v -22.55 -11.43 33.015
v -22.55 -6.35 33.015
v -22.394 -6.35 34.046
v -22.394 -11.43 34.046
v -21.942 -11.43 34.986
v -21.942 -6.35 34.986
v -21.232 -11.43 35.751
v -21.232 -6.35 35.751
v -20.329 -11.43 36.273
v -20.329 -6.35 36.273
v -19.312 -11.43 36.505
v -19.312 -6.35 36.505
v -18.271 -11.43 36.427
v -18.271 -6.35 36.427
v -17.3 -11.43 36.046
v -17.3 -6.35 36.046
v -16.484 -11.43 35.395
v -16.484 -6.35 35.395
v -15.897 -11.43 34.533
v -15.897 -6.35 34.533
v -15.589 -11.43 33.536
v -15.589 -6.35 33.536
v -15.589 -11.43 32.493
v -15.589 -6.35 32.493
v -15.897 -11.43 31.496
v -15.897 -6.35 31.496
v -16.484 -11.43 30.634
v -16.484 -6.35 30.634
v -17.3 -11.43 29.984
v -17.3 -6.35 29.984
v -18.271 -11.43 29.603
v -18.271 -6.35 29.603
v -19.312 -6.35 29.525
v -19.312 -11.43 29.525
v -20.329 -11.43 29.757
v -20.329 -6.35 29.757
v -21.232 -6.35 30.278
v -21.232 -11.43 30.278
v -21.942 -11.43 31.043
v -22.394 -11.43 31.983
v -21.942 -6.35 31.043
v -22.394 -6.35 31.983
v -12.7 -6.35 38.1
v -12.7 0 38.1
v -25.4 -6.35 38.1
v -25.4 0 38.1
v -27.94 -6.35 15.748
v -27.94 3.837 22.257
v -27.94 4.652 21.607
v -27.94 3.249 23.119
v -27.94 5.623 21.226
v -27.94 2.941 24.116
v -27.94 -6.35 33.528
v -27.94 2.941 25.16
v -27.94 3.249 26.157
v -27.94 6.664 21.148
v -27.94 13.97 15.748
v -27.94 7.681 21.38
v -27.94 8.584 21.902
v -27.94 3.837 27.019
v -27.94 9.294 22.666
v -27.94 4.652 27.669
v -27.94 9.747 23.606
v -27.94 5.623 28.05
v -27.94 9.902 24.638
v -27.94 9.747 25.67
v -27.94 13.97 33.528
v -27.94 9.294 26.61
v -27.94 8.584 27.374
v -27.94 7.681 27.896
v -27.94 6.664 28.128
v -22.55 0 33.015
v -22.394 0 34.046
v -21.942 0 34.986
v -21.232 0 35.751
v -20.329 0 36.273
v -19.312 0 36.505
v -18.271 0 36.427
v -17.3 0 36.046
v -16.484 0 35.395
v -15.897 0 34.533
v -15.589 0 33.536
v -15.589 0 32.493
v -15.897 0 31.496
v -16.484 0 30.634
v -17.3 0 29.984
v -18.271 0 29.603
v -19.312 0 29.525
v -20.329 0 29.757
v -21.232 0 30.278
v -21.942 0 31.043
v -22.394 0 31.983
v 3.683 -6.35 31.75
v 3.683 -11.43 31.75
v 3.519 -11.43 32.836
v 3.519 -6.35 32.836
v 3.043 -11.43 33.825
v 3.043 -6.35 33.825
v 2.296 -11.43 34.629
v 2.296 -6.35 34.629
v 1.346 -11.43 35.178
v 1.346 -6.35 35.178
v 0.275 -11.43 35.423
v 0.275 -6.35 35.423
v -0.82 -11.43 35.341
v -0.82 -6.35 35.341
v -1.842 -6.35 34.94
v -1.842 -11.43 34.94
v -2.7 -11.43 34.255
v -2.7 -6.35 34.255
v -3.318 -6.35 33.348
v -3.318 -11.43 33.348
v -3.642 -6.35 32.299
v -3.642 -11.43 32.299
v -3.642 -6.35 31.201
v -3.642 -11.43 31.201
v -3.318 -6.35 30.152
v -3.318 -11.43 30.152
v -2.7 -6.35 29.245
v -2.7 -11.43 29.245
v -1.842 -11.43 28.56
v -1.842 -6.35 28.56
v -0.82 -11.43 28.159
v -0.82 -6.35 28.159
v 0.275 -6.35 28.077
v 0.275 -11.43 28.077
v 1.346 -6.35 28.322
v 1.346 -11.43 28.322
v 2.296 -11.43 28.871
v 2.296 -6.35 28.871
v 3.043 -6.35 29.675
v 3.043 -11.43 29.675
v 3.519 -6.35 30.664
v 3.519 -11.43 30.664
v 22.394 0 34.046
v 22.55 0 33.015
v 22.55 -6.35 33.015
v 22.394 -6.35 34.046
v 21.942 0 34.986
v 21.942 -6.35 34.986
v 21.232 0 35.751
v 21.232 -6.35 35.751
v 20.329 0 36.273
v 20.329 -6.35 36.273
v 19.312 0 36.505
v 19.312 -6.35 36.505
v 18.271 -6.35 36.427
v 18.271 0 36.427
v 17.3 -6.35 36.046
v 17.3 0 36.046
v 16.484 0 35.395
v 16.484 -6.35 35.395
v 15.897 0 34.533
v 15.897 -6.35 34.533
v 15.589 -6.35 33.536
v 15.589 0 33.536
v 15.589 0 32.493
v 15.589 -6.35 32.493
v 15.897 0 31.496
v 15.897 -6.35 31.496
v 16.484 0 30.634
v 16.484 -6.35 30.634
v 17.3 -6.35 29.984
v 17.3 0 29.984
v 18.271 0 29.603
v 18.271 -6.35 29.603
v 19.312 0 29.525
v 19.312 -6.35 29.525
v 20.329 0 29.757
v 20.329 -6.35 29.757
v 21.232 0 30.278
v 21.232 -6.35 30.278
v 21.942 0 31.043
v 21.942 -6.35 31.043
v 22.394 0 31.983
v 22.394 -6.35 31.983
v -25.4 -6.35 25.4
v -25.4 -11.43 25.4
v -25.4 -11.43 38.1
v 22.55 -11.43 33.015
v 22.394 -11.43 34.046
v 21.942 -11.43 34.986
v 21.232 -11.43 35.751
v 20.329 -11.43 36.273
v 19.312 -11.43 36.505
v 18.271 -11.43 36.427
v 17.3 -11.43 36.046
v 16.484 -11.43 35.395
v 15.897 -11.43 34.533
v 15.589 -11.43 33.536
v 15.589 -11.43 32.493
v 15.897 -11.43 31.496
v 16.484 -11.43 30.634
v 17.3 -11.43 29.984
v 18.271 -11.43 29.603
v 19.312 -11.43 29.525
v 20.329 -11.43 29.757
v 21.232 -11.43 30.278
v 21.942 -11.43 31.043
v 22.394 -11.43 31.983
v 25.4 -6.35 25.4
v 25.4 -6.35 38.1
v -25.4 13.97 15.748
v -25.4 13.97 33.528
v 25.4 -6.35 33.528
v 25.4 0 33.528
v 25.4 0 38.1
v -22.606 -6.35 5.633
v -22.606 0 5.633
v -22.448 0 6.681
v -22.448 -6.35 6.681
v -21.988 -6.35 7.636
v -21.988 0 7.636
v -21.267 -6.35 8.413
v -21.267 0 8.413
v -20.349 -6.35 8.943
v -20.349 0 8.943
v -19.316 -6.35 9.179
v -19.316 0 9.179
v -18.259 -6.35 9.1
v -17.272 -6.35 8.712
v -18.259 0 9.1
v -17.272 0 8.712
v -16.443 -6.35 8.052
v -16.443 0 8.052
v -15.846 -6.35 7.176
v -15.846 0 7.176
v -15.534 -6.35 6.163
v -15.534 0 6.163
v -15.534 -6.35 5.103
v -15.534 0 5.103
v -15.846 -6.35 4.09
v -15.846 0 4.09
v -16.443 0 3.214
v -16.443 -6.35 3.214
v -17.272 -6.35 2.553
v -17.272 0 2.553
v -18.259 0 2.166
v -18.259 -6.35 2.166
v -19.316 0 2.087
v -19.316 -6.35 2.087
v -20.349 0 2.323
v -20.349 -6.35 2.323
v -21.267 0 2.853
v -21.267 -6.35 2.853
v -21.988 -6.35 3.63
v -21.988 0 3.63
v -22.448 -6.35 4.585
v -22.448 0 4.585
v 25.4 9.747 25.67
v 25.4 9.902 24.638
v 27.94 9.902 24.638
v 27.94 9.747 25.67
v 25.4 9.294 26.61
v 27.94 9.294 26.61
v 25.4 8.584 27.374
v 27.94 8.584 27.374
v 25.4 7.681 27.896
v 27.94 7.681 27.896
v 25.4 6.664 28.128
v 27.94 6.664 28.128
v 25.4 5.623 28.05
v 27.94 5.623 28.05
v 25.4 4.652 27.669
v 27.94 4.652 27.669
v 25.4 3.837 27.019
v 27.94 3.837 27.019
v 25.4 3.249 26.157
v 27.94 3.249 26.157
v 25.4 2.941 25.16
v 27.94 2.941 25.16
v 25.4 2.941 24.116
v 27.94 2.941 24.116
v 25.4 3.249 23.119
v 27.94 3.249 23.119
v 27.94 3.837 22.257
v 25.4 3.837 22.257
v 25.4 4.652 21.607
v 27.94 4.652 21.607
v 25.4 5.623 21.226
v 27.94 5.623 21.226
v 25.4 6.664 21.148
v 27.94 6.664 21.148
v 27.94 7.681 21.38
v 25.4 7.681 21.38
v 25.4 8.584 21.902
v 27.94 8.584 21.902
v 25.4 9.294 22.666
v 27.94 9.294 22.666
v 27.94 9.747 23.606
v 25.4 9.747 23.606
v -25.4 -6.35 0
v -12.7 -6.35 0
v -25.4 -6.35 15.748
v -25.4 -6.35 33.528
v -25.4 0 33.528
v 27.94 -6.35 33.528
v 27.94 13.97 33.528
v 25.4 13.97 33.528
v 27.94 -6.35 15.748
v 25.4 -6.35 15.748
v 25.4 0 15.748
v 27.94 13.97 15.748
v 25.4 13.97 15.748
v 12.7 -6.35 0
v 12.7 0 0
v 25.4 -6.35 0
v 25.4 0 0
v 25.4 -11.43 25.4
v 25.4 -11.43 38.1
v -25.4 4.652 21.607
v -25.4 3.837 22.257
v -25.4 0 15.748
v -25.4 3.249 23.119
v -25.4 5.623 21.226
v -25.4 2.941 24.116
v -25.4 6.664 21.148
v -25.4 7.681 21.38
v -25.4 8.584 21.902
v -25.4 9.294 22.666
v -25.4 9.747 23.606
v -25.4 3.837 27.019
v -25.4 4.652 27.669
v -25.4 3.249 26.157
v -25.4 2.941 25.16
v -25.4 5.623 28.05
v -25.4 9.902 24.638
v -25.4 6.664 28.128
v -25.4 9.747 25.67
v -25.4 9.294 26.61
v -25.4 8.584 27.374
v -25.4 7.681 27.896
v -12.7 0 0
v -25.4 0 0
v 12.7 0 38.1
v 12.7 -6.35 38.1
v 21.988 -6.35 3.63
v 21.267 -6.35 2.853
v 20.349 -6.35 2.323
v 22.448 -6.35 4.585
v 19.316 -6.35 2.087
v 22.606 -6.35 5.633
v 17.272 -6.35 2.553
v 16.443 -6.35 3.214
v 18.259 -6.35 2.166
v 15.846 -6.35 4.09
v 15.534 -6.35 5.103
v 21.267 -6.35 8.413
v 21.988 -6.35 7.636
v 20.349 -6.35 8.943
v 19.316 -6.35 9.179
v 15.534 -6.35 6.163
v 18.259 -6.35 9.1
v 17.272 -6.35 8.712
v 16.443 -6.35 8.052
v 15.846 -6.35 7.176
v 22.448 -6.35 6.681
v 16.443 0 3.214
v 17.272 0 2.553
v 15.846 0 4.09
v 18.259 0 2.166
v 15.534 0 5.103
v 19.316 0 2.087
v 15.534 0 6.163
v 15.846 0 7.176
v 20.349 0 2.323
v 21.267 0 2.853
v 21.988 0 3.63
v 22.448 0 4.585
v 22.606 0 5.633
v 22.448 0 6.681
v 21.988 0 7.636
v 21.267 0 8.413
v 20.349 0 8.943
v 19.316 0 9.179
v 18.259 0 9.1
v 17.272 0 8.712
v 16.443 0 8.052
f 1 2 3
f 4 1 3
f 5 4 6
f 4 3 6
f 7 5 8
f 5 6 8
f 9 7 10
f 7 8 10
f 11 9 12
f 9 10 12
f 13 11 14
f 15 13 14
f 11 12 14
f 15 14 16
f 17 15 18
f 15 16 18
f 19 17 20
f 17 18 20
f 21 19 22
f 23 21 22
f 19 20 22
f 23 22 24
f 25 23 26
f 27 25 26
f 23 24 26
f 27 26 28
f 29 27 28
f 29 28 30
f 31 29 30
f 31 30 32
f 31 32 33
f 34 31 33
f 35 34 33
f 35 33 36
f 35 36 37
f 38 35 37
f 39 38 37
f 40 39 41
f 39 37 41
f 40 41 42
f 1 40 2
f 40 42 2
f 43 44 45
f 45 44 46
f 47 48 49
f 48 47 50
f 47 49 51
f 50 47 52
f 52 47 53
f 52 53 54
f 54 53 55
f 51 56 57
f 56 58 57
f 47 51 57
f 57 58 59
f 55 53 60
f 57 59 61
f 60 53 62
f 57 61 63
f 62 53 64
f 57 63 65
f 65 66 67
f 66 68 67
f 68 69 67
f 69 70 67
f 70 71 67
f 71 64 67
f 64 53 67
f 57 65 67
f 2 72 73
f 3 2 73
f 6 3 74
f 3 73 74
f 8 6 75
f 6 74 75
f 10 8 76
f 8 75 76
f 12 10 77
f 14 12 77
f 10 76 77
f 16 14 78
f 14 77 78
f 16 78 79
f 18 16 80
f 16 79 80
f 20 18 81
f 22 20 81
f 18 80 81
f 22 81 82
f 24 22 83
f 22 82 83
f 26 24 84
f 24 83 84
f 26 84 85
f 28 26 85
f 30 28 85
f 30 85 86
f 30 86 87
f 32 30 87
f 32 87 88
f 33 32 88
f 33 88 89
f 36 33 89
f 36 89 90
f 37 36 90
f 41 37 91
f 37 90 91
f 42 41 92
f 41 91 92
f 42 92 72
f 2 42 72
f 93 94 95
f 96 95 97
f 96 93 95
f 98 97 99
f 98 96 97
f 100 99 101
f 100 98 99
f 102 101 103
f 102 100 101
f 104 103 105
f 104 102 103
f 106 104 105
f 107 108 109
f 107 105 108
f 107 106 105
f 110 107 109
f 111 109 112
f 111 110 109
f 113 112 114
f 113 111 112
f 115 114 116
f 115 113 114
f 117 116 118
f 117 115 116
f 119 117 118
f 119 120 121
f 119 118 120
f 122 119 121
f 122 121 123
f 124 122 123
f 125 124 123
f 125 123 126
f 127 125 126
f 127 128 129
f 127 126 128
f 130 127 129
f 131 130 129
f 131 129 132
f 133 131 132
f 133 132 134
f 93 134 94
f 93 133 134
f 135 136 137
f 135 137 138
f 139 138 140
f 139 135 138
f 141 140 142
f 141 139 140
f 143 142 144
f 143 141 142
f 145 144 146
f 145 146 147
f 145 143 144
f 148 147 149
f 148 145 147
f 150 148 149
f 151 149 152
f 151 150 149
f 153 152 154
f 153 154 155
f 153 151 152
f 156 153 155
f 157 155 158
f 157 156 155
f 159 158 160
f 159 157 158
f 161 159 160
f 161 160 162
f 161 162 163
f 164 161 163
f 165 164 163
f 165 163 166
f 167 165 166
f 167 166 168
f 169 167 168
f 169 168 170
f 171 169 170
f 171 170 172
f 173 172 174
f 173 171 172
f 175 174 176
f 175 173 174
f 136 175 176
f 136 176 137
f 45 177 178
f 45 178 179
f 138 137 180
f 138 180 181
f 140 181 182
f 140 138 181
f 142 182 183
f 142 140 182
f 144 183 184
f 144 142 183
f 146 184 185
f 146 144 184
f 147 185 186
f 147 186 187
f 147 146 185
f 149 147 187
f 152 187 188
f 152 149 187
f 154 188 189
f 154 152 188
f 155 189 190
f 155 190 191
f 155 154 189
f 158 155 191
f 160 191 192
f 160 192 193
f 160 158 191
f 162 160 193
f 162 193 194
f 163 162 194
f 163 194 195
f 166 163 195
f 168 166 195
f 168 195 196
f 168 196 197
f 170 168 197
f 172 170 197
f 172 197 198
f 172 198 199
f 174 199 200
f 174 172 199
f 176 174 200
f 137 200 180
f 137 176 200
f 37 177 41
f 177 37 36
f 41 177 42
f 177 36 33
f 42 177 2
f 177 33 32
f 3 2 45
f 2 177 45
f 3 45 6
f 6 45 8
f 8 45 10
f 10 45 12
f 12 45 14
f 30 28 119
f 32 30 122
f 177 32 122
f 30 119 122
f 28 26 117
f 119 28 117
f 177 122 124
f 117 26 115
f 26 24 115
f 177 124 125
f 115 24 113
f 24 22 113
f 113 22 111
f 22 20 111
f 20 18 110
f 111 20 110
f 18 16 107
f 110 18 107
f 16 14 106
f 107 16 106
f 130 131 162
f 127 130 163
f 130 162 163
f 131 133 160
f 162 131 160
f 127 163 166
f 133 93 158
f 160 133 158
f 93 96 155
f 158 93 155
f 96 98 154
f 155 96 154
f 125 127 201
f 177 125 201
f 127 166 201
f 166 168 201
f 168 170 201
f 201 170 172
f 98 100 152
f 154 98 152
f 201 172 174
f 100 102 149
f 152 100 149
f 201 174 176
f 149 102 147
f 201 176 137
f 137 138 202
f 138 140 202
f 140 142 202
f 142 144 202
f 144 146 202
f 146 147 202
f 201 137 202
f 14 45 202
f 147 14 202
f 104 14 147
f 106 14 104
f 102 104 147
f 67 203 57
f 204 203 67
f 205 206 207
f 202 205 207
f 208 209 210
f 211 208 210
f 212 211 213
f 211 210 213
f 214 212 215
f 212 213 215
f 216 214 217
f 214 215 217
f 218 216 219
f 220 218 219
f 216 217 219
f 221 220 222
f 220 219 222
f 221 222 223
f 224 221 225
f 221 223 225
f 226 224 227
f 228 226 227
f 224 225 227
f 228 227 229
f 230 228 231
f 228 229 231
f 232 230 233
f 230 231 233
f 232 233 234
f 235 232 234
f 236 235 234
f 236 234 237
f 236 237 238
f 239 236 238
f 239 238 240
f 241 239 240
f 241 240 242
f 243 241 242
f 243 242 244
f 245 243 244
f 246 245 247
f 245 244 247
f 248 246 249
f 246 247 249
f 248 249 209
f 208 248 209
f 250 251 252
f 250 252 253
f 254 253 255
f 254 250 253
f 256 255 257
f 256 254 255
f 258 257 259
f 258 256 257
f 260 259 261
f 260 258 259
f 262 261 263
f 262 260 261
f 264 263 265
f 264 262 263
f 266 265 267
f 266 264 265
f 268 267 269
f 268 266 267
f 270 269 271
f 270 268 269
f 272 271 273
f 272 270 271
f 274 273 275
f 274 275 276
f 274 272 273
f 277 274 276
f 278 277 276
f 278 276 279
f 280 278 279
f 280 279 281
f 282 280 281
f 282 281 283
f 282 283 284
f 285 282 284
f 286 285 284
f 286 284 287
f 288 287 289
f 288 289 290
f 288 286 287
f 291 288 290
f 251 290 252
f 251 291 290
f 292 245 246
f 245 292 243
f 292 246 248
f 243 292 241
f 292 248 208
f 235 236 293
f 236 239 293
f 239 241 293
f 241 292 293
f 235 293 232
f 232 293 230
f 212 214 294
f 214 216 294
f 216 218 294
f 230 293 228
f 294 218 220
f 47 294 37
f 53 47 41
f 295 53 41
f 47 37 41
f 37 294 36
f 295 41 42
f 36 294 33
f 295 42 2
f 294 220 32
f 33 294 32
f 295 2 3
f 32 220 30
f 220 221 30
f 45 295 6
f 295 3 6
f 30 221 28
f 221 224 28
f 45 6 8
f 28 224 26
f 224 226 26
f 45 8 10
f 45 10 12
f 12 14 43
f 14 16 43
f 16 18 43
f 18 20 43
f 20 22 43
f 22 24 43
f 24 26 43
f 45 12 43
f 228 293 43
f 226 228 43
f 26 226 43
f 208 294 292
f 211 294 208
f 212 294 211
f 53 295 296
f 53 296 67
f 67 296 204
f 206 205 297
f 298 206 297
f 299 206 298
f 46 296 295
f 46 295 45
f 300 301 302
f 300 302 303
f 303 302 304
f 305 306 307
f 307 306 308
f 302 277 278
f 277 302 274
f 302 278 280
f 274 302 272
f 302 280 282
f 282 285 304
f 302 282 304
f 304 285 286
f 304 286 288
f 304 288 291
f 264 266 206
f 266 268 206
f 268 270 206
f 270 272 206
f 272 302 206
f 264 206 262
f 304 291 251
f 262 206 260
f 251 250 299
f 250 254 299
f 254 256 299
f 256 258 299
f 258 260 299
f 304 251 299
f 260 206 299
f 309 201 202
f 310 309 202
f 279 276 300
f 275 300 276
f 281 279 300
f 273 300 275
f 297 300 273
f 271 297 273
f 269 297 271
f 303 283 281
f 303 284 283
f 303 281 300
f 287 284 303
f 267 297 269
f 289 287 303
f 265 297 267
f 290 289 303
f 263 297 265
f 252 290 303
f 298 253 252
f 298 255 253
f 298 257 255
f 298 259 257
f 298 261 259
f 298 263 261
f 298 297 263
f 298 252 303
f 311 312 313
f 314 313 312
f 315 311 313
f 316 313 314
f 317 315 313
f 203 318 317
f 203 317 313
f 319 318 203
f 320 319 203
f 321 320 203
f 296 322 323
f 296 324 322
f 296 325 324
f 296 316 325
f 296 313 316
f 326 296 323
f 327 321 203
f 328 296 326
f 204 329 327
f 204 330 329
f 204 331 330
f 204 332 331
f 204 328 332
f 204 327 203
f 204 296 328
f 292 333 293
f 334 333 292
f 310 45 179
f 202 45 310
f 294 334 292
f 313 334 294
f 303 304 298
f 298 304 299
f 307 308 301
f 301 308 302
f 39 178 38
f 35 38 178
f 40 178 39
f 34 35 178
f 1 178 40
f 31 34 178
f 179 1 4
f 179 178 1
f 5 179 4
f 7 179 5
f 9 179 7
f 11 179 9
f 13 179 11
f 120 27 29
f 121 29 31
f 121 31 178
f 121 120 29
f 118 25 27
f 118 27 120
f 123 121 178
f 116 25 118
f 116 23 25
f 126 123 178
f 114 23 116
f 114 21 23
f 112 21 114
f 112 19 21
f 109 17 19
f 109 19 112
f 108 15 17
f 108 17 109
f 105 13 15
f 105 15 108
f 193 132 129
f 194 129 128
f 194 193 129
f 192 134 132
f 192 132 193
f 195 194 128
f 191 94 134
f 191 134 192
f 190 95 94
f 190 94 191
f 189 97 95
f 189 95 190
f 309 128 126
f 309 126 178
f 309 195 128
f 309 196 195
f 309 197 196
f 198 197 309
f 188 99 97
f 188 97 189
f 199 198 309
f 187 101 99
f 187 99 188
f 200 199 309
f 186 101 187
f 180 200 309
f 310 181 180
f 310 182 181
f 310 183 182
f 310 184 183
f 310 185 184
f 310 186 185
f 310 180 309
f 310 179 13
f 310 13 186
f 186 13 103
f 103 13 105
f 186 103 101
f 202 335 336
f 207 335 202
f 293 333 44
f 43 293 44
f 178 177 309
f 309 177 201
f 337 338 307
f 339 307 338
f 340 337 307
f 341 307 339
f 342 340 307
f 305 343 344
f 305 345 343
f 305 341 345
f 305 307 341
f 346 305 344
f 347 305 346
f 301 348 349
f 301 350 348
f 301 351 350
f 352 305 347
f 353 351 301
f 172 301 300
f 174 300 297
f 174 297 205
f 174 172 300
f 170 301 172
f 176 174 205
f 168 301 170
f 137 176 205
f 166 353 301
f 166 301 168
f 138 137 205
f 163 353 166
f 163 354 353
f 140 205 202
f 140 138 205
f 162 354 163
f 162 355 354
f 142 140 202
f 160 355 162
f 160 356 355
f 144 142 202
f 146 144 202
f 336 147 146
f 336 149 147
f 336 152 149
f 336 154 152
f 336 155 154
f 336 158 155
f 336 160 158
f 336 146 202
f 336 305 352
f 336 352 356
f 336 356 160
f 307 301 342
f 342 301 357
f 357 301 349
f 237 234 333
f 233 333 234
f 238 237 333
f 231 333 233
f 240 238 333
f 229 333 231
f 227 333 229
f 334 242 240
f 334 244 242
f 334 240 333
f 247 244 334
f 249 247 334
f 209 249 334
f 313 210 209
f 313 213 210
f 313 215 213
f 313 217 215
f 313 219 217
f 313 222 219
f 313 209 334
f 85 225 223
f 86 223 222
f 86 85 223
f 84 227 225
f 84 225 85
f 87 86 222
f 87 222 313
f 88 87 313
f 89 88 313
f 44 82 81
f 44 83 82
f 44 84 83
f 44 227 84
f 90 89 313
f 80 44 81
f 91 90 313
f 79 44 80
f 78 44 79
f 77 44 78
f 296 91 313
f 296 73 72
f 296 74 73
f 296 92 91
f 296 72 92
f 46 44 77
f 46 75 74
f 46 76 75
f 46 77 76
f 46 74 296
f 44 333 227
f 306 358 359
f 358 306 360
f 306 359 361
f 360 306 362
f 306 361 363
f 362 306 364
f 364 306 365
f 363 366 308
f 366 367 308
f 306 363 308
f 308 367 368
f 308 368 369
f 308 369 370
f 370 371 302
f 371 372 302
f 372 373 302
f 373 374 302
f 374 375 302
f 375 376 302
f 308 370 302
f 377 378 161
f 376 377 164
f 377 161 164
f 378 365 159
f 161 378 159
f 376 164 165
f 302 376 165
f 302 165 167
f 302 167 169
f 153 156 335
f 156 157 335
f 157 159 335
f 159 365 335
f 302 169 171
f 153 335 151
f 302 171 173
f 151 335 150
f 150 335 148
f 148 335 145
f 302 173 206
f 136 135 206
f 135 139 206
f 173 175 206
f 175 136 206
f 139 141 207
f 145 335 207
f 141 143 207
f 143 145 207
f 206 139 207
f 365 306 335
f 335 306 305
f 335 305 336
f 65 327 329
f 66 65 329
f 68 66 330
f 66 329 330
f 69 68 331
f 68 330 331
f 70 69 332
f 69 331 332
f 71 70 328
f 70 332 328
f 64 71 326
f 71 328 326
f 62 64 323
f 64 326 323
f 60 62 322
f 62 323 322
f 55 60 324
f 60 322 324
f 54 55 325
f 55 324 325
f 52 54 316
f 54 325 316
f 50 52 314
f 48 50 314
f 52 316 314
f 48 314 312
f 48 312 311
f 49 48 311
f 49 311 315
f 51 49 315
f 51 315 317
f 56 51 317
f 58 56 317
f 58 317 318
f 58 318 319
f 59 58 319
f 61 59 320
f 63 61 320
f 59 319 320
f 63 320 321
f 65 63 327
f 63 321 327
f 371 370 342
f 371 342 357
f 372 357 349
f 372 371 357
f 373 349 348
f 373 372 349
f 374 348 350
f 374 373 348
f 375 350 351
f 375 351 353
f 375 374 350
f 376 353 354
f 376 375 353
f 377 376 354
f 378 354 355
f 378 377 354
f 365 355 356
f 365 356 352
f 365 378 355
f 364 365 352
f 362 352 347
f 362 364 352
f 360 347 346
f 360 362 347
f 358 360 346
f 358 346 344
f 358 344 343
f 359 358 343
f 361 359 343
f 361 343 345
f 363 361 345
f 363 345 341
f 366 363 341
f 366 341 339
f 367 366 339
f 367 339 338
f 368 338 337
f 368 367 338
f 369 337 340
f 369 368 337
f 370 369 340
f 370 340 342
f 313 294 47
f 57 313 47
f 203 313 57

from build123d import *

# Parameters (mm, degrees)
F0_W     = 12.7
F0_H     = 38.1
F0_R     = 3.556
F0_R_2   = 3.499993
F1_DEPTH = 6.35
F2_W     = 35.56
F2_H     = 12.7
F2_R     = 3.683
F2_R_2   = 3.499993
F3_DEPTH = 5.08
F6_W     = 20.32
F6_H     = 17.78
F6_R     = 3.499993
F7_DEPTH = 2.54


with BuildPart() as f1:
    # F0 (on Front) → F1 (new body)
    with BuildSketch(Plane.XZ):
        with Locations((19.05, 19.05)):
            Rectangle(F0_W, F0_H)
        with Locations((19.0500002354, 5.6328698993)):
            Circle(F0_R, mode=Mode.SUBTRACT)
        with Locations((19.0499993676, 33.0148091292)):
            Circle(F0_R_2, mode=Mode.SUBTRACT)
    extrude(amount=F1_DEPTH)


with BuildPart() as f3:
    # F2 (on face) → F3 (new body)
    with BuildSketch(Plane.XZ.offset(6.35)):
        with Locations((7.62, 31.75)):
            Rectangle(F2_W, F2_H)
        with Locations((0, 31.75)):
            Circle(F2_R, mode=Mode.SUBTRACT)
        with Locations((19.0499993676, 33.0148091292)):
            Circle(F2_R_2, mode=Mode.SUBTRACT)
    extrude(amount=F3_DEPTH)

    # F4: F3 across plane


with BuildPart() as f3_1:
    add(f3.part)
    add(f3.part.mirror(Plane.YZ))


with BuildPart() as f5_1:
    # F5: instance of F1
    add(f1.part.mirror(Plane.YZ))


with BuildPart() as f1_1:
    add(f1.part)

    # F6 (on face) → F7 (join)
    with BuildSketch(Plane.YZ.offset(25.4)):
        with Locations((3.8100000767, 24.6379904592)):
            Rectangle(F6_W, F6_H)
        with Locations((6.4022434711, 24.6379904592)):
            Circle(F6_R, mode=Mode.SUBTRACT)
    extrude(amount=F7_DEPTH)


with BuildPart() as f8_1:
    # F8: instance of F1
    add(f1_1.part.mirror(Plane.YZ))


solid = Compound([f3_1.part, f1_1.part, f8_1.part])
